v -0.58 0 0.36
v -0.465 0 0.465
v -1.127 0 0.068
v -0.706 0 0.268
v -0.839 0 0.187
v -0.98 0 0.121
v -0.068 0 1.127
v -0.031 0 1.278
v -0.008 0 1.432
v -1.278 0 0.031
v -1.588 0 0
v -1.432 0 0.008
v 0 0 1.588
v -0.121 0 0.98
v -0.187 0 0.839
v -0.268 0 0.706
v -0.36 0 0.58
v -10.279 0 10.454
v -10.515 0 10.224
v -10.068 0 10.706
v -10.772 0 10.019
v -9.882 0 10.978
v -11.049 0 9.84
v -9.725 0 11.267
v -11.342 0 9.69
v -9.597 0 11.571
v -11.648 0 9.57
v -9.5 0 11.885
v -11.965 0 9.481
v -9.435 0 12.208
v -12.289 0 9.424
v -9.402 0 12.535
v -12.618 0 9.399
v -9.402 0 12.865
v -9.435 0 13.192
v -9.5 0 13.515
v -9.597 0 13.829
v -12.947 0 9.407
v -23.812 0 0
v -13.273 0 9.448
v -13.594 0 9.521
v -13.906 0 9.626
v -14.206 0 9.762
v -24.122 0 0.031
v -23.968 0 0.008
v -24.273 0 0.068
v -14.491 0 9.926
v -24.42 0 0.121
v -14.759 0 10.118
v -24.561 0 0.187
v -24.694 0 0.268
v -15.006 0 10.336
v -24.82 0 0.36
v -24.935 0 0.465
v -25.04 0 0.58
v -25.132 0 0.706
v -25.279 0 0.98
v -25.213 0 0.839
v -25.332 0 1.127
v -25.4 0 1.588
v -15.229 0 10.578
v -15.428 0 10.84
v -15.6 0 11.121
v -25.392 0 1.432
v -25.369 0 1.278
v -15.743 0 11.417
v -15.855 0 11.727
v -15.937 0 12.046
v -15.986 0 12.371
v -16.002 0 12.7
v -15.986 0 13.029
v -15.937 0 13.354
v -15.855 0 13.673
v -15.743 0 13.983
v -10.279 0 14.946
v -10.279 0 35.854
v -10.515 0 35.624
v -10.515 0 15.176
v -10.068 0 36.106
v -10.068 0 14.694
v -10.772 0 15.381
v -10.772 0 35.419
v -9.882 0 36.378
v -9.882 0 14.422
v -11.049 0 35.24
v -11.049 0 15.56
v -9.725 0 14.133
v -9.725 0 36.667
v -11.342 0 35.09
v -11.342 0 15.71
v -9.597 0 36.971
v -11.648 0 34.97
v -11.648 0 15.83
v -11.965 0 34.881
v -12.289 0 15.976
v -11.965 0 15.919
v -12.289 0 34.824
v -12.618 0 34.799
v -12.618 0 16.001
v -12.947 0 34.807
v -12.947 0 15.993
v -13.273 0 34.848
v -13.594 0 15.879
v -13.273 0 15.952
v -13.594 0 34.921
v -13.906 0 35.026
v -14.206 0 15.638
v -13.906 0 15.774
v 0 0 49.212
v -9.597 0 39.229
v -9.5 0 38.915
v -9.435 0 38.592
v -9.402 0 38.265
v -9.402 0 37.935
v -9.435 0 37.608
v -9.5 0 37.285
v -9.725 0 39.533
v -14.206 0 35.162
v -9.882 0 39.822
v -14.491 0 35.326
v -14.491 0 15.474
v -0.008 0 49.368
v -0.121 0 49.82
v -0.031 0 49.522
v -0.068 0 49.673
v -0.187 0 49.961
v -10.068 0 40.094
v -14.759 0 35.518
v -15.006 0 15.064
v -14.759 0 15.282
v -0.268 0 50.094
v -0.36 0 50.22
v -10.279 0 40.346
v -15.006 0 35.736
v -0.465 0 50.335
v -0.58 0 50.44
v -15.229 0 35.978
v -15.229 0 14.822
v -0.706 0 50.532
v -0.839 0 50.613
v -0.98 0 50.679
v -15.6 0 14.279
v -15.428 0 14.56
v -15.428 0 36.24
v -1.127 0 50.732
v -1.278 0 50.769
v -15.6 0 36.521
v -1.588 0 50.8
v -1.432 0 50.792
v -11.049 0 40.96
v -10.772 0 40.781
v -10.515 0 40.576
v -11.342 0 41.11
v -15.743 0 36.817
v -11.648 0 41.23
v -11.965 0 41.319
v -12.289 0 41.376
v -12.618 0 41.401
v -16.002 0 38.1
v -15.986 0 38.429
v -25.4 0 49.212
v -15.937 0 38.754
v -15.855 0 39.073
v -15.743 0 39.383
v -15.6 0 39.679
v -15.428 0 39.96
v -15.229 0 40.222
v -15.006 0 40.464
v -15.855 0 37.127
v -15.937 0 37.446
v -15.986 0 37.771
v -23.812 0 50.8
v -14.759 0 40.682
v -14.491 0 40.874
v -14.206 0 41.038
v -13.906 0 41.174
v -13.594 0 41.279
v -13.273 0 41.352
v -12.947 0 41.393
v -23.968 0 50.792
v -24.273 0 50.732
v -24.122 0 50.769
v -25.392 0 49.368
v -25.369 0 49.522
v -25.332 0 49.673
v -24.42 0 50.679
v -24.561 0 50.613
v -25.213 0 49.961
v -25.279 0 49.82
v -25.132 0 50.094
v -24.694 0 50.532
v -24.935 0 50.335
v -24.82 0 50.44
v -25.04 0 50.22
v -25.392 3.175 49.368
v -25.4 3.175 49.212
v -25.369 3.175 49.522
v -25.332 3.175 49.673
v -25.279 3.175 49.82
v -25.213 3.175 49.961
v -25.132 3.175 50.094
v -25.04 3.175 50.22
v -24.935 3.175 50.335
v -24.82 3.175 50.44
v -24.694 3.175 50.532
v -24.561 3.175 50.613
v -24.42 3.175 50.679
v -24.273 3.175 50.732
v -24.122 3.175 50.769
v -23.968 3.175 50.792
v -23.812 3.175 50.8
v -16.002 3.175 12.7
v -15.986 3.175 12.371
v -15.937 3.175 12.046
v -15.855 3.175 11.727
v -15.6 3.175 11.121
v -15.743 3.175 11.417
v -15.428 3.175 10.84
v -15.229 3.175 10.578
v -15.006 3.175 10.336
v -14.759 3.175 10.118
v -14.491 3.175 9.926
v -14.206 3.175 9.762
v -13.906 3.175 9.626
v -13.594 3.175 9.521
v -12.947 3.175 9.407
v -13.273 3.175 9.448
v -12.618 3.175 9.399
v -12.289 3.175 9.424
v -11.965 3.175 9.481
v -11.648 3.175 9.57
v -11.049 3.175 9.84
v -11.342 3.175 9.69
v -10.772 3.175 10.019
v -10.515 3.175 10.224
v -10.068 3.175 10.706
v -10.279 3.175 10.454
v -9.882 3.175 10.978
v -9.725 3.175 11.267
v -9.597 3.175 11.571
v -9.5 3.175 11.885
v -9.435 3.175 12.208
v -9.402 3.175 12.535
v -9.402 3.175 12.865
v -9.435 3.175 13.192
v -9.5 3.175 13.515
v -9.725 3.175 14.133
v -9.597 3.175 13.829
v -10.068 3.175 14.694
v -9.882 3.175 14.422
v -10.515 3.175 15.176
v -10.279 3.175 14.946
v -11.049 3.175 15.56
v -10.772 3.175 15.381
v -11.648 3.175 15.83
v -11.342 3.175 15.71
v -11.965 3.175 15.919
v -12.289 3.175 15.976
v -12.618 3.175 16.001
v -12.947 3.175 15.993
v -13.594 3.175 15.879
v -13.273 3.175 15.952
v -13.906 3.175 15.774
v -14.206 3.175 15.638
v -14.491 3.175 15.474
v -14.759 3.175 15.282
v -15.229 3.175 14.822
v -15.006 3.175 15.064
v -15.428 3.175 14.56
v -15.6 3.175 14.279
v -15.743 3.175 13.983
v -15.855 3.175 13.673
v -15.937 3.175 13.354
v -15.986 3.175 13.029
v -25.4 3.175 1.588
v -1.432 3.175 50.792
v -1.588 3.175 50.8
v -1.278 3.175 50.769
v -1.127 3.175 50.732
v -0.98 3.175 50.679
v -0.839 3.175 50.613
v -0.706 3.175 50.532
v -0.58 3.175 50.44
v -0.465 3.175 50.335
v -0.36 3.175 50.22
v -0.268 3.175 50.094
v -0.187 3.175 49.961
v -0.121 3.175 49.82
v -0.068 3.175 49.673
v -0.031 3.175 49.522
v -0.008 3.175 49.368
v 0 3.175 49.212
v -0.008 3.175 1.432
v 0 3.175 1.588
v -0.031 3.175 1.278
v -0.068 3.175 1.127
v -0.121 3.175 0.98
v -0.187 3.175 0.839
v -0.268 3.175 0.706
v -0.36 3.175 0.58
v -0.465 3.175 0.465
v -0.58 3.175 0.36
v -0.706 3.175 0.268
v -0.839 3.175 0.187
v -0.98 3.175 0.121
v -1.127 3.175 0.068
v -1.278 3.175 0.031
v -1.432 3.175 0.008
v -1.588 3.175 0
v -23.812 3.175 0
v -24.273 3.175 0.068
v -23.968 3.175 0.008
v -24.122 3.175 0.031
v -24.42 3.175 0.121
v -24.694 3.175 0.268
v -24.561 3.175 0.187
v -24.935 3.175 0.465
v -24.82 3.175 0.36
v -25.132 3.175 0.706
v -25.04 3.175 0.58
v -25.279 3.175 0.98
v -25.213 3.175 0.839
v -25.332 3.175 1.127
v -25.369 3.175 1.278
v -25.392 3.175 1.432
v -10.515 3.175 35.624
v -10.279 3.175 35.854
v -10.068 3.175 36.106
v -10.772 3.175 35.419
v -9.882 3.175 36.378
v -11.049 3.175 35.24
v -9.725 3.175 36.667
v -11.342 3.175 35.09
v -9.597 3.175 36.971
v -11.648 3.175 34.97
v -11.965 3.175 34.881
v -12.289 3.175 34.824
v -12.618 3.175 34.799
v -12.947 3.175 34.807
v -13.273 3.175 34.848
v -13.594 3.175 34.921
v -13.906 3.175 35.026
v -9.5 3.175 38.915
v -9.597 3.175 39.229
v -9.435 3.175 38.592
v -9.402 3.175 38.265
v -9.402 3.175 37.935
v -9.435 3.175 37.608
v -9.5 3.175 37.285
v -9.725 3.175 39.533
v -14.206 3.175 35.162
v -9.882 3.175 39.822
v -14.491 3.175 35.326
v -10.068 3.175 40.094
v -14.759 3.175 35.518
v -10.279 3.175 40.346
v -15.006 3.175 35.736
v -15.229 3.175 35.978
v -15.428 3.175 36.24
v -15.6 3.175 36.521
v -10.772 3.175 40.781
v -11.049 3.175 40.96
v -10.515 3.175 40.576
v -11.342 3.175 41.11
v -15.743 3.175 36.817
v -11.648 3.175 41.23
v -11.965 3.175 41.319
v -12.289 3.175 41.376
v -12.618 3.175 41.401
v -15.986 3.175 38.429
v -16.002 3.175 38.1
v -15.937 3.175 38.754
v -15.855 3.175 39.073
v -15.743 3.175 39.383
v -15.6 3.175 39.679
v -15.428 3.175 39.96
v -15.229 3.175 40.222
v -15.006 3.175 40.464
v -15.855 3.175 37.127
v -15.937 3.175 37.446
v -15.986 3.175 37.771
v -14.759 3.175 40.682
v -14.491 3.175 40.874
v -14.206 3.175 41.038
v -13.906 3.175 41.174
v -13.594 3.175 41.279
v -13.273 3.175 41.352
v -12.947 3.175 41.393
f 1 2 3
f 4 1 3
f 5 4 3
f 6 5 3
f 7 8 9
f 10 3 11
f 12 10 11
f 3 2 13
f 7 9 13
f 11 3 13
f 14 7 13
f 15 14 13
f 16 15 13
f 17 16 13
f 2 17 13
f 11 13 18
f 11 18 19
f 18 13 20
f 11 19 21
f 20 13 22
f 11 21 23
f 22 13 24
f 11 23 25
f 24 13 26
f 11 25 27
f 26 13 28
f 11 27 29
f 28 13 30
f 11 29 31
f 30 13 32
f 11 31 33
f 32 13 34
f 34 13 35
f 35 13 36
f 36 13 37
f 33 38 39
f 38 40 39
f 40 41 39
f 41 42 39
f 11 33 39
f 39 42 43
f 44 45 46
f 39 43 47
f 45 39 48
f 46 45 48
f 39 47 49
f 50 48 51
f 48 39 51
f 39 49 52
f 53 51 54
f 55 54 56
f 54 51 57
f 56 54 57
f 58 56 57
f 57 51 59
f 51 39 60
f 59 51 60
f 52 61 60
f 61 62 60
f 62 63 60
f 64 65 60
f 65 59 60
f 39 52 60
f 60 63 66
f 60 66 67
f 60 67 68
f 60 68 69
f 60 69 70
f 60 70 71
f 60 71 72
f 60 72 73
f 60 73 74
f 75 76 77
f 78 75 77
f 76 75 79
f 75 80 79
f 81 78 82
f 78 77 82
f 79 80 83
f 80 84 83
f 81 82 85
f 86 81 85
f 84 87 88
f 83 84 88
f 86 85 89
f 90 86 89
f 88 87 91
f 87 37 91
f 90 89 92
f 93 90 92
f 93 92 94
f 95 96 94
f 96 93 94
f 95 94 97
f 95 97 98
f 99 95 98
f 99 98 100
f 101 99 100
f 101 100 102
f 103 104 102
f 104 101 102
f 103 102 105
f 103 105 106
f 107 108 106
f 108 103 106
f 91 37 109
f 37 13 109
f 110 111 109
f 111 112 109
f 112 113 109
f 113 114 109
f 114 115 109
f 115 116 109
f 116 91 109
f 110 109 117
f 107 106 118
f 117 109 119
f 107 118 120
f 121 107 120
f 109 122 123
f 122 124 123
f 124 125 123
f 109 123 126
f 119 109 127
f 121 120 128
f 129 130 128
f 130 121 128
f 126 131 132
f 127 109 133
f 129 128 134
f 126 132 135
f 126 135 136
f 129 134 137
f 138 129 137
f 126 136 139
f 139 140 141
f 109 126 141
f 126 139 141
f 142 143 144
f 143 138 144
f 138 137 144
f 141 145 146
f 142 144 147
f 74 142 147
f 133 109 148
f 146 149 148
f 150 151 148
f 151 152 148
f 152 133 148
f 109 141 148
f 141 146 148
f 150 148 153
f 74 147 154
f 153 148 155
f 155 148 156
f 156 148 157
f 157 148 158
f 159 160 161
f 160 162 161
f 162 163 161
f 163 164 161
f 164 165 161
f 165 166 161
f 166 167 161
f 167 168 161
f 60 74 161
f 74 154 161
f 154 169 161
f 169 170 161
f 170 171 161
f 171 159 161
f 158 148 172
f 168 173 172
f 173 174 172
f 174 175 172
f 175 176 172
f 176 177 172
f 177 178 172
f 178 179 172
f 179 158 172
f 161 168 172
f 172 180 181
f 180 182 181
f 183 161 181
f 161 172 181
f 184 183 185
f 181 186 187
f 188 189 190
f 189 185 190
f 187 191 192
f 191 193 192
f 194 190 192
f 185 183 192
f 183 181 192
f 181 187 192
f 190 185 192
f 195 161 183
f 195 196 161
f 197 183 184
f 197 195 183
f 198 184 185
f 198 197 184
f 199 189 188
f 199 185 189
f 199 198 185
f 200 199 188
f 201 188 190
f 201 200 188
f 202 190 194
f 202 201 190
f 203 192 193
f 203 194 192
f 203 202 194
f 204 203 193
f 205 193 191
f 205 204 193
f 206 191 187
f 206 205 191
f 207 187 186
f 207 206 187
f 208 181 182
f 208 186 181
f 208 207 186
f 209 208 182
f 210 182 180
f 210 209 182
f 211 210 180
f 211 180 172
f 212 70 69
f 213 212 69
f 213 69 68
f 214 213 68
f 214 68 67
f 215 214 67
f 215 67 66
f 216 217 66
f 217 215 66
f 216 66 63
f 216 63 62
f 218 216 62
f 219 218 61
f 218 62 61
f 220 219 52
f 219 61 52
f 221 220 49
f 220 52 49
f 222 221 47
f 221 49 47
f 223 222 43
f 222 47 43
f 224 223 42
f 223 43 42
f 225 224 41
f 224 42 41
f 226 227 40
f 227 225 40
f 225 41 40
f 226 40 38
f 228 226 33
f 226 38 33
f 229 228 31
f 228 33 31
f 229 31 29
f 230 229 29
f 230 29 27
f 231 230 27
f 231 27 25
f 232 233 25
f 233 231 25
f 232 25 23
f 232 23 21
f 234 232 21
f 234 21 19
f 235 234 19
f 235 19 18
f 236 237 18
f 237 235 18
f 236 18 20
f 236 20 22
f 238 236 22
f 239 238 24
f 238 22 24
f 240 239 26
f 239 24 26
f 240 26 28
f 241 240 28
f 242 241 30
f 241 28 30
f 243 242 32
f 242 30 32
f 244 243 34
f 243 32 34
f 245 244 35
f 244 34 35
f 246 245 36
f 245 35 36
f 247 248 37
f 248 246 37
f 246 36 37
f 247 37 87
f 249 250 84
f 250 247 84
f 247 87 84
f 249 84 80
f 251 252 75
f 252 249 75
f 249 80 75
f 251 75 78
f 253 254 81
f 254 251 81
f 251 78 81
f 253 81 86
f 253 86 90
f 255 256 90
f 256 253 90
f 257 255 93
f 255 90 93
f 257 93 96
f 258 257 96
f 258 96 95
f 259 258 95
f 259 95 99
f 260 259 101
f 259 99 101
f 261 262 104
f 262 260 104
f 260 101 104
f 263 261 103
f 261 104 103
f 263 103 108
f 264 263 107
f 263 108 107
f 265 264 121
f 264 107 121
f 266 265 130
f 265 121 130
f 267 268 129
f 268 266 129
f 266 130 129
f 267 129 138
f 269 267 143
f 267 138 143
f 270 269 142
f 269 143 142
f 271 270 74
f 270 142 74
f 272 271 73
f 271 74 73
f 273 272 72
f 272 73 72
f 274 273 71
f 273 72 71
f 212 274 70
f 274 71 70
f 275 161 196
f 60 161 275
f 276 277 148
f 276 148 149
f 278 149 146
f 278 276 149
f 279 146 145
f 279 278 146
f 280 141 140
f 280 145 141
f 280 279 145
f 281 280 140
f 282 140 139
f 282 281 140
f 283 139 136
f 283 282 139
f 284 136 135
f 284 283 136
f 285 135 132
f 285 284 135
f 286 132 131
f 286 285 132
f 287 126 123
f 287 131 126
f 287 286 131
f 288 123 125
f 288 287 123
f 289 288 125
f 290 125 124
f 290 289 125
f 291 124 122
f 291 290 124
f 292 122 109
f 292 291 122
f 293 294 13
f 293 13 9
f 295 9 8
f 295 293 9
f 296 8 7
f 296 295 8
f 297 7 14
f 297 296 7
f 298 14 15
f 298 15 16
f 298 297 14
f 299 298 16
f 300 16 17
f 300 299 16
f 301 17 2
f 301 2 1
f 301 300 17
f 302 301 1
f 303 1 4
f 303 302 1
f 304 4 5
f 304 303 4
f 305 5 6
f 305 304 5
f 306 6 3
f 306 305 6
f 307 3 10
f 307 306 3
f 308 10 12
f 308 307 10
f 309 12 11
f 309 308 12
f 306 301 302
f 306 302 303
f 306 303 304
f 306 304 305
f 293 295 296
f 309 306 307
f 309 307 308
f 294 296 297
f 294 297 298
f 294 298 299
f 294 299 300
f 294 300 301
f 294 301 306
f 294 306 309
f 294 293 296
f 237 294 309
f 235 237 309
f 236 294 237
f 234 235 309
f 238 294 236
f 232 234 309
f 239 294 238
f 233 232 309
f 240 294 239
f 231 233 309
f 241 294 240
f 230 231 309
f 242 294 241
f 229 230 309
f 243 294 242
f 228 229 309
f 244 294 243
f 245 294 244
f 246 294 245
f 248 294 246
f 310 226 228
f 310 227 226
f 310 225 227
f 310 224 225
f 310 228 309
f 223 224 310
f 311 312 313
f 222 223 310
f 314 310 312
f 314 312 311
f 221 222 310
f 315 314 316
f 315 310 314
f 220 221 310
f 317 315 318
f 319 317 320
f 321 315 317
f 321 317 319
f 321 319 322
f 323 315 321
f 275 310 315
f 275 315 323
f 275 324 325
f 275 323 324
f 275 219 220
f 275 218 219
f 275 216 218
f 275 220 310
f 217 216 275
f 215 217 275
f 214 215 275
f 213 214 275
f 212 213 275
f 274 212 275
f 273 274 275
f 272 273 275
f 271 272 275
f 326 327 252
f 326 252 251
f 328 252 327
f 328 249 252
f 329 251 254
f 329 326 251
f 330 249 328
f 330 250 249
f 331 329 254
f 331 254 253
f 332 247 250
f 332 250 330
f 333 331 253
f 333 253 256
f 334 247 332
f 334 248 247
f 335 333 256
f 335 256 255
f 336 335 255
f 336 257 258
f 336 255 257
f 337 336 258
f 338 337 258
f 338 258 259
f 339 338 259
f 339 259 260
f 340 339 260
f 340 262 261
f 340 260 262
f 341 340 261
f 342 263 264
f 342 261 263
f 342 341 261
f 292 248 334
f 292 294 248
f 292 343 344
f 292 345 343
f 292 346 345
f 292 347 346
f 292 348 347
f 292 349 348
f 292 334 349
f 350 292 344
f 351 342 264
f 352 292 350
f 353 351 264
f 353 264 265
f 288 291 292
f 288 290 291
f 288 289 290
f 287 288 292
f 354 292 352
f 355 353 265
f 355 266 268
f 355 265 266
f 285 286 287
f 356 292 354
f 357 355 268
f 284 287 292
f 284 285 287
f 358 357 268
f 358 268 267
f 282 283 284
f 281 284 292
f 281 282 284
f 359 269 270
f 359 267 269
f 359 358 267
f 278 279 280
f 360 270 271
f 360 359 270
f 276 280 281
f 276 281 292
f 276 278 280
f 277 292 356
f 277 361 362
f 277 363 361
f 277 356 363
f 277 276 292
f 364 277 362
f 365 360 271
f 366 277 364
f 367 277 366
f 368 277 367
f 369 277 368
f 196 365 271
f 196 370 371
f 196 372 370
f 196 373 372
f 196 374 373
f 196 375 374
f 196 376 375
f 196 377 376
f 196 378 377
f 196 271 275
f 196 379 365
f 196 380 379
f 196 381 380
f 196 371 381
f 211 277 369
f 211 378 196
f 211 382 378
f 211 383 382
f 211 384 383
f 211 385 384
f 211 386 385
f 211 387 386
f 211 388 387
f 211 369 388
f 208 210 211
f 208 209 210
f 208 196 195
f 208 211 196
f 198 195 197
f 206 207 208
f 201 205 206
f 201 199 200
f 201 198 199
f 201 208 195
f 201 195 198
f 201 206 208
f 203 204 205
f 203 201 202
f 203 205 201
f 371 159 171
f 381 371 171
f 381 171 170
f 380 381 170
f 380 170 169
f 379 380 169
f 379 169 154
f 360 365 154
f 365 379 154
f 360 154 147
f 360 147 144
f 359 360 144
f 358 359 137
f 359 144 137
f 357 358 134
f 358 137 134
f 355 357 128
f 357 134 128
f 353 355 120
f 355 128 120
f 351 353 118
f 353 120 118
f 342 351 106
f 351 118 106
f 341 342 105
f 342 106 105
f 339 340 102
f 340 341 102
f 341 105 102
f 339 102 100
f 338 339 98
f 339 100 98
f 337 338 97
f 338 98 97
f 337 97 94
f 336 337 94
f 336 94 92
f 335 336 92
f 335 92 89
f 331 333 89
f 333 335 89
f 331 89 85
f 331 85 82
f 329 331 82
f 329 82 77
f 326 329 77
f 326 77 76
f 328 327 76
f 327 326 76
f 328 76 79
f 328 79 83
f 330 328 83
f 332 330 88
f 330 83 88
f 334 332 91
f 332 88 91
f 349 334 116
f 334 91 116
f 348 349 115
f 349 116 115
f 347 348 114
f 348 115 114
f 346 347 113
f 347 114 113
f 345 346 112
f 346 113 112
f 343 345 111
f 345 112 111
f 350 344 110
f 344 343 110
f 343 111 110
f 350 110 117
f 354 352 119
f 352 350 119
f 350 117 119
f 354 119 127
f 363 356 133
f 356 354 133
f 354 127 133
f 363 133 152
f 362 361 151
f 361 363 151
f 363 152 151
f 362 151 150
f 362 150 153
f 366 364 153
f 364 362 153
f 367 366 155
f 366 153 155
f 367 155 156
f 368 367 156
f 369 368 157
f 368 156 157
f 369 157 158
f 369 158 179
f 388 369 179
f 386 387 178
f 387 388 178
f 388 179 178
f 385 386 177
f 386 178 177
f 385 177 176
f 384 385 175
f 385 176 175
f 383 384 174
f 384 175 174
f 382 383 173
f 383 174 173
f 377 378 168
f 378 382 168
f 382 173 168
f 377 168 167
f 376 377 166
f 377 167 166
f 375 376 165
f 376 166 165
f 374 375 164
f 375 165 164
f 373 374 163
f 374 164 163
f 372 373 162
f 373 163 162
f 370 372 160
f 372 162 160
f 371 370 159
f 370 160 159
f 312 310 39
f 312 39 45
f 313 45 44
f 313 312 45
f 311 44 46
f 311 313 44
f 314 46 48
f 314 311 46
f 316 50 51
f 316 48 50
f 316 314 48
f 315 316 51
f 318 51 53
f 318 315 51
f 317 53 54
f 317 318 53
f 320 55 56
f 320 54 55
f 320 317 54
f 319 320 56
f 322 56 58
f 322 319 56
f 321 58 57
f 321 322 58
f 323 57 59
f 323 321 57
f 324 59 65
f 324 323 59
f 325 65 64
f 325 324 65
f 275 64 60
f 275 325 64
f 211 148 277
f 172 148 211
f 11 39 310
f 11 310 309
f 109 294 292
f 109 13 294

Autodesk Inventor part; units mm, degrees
ref_plane "YZ Plane" through (0, 0, 0) normal (1, 0, 0) x (0, 1, 0)
ref_plane "XZ Plane" through (0, 0, 0) normal (0, 1, 0) x (-1, 0, 0)
ref_plane "XY Plane" through (0, 0, 0) normal (0, 0, 1) x (1, 0, 0)
sketch "Sketch1" plane through (0, 0, 0) normal (0, 1, 0) x (-1, 0, 0)
  line L0 (0, 0) -> (0, 50.8)
  line L1 (0, 50.8) -> (25.4, 50.8)
  line L2 (25.4, 50.8) -> (25.4, 0)
  line L3 (25.4, 0) -> (0, 0)
  circle A0 centre (12.7, 38.1) radius 3.302
  circle A1 centre (12.7, 12.7) radius 3.302
  line L4 (0, 25.4) -> (25.4, 25.4) construction
  line L5 (12.7, 38.1) -> (12.7, 12.7) construction
  point P0 (12.7, 25.4)
  dimension "d0" = 50.8
  dimension "d1" = 25.4
  dimension "d2" = 6.604
  dimension "d3" = 6.604
  dimension "d4" = 25.4
extrude "Extrusion1" add sketch "Sketch1" along normal blind 3.175
fillet "Fillet1" radius 1.5875 4 edges at (-25.4, 1.5875, 50.8) (0, 1.5875, 50.8) (0, 1.5875, 0) (-25.4, 1.5875, 0)
equation "\"d3\" = d2"
properties part number "Chassis Connector Plate V1.500" material "Aluminum 6061"
